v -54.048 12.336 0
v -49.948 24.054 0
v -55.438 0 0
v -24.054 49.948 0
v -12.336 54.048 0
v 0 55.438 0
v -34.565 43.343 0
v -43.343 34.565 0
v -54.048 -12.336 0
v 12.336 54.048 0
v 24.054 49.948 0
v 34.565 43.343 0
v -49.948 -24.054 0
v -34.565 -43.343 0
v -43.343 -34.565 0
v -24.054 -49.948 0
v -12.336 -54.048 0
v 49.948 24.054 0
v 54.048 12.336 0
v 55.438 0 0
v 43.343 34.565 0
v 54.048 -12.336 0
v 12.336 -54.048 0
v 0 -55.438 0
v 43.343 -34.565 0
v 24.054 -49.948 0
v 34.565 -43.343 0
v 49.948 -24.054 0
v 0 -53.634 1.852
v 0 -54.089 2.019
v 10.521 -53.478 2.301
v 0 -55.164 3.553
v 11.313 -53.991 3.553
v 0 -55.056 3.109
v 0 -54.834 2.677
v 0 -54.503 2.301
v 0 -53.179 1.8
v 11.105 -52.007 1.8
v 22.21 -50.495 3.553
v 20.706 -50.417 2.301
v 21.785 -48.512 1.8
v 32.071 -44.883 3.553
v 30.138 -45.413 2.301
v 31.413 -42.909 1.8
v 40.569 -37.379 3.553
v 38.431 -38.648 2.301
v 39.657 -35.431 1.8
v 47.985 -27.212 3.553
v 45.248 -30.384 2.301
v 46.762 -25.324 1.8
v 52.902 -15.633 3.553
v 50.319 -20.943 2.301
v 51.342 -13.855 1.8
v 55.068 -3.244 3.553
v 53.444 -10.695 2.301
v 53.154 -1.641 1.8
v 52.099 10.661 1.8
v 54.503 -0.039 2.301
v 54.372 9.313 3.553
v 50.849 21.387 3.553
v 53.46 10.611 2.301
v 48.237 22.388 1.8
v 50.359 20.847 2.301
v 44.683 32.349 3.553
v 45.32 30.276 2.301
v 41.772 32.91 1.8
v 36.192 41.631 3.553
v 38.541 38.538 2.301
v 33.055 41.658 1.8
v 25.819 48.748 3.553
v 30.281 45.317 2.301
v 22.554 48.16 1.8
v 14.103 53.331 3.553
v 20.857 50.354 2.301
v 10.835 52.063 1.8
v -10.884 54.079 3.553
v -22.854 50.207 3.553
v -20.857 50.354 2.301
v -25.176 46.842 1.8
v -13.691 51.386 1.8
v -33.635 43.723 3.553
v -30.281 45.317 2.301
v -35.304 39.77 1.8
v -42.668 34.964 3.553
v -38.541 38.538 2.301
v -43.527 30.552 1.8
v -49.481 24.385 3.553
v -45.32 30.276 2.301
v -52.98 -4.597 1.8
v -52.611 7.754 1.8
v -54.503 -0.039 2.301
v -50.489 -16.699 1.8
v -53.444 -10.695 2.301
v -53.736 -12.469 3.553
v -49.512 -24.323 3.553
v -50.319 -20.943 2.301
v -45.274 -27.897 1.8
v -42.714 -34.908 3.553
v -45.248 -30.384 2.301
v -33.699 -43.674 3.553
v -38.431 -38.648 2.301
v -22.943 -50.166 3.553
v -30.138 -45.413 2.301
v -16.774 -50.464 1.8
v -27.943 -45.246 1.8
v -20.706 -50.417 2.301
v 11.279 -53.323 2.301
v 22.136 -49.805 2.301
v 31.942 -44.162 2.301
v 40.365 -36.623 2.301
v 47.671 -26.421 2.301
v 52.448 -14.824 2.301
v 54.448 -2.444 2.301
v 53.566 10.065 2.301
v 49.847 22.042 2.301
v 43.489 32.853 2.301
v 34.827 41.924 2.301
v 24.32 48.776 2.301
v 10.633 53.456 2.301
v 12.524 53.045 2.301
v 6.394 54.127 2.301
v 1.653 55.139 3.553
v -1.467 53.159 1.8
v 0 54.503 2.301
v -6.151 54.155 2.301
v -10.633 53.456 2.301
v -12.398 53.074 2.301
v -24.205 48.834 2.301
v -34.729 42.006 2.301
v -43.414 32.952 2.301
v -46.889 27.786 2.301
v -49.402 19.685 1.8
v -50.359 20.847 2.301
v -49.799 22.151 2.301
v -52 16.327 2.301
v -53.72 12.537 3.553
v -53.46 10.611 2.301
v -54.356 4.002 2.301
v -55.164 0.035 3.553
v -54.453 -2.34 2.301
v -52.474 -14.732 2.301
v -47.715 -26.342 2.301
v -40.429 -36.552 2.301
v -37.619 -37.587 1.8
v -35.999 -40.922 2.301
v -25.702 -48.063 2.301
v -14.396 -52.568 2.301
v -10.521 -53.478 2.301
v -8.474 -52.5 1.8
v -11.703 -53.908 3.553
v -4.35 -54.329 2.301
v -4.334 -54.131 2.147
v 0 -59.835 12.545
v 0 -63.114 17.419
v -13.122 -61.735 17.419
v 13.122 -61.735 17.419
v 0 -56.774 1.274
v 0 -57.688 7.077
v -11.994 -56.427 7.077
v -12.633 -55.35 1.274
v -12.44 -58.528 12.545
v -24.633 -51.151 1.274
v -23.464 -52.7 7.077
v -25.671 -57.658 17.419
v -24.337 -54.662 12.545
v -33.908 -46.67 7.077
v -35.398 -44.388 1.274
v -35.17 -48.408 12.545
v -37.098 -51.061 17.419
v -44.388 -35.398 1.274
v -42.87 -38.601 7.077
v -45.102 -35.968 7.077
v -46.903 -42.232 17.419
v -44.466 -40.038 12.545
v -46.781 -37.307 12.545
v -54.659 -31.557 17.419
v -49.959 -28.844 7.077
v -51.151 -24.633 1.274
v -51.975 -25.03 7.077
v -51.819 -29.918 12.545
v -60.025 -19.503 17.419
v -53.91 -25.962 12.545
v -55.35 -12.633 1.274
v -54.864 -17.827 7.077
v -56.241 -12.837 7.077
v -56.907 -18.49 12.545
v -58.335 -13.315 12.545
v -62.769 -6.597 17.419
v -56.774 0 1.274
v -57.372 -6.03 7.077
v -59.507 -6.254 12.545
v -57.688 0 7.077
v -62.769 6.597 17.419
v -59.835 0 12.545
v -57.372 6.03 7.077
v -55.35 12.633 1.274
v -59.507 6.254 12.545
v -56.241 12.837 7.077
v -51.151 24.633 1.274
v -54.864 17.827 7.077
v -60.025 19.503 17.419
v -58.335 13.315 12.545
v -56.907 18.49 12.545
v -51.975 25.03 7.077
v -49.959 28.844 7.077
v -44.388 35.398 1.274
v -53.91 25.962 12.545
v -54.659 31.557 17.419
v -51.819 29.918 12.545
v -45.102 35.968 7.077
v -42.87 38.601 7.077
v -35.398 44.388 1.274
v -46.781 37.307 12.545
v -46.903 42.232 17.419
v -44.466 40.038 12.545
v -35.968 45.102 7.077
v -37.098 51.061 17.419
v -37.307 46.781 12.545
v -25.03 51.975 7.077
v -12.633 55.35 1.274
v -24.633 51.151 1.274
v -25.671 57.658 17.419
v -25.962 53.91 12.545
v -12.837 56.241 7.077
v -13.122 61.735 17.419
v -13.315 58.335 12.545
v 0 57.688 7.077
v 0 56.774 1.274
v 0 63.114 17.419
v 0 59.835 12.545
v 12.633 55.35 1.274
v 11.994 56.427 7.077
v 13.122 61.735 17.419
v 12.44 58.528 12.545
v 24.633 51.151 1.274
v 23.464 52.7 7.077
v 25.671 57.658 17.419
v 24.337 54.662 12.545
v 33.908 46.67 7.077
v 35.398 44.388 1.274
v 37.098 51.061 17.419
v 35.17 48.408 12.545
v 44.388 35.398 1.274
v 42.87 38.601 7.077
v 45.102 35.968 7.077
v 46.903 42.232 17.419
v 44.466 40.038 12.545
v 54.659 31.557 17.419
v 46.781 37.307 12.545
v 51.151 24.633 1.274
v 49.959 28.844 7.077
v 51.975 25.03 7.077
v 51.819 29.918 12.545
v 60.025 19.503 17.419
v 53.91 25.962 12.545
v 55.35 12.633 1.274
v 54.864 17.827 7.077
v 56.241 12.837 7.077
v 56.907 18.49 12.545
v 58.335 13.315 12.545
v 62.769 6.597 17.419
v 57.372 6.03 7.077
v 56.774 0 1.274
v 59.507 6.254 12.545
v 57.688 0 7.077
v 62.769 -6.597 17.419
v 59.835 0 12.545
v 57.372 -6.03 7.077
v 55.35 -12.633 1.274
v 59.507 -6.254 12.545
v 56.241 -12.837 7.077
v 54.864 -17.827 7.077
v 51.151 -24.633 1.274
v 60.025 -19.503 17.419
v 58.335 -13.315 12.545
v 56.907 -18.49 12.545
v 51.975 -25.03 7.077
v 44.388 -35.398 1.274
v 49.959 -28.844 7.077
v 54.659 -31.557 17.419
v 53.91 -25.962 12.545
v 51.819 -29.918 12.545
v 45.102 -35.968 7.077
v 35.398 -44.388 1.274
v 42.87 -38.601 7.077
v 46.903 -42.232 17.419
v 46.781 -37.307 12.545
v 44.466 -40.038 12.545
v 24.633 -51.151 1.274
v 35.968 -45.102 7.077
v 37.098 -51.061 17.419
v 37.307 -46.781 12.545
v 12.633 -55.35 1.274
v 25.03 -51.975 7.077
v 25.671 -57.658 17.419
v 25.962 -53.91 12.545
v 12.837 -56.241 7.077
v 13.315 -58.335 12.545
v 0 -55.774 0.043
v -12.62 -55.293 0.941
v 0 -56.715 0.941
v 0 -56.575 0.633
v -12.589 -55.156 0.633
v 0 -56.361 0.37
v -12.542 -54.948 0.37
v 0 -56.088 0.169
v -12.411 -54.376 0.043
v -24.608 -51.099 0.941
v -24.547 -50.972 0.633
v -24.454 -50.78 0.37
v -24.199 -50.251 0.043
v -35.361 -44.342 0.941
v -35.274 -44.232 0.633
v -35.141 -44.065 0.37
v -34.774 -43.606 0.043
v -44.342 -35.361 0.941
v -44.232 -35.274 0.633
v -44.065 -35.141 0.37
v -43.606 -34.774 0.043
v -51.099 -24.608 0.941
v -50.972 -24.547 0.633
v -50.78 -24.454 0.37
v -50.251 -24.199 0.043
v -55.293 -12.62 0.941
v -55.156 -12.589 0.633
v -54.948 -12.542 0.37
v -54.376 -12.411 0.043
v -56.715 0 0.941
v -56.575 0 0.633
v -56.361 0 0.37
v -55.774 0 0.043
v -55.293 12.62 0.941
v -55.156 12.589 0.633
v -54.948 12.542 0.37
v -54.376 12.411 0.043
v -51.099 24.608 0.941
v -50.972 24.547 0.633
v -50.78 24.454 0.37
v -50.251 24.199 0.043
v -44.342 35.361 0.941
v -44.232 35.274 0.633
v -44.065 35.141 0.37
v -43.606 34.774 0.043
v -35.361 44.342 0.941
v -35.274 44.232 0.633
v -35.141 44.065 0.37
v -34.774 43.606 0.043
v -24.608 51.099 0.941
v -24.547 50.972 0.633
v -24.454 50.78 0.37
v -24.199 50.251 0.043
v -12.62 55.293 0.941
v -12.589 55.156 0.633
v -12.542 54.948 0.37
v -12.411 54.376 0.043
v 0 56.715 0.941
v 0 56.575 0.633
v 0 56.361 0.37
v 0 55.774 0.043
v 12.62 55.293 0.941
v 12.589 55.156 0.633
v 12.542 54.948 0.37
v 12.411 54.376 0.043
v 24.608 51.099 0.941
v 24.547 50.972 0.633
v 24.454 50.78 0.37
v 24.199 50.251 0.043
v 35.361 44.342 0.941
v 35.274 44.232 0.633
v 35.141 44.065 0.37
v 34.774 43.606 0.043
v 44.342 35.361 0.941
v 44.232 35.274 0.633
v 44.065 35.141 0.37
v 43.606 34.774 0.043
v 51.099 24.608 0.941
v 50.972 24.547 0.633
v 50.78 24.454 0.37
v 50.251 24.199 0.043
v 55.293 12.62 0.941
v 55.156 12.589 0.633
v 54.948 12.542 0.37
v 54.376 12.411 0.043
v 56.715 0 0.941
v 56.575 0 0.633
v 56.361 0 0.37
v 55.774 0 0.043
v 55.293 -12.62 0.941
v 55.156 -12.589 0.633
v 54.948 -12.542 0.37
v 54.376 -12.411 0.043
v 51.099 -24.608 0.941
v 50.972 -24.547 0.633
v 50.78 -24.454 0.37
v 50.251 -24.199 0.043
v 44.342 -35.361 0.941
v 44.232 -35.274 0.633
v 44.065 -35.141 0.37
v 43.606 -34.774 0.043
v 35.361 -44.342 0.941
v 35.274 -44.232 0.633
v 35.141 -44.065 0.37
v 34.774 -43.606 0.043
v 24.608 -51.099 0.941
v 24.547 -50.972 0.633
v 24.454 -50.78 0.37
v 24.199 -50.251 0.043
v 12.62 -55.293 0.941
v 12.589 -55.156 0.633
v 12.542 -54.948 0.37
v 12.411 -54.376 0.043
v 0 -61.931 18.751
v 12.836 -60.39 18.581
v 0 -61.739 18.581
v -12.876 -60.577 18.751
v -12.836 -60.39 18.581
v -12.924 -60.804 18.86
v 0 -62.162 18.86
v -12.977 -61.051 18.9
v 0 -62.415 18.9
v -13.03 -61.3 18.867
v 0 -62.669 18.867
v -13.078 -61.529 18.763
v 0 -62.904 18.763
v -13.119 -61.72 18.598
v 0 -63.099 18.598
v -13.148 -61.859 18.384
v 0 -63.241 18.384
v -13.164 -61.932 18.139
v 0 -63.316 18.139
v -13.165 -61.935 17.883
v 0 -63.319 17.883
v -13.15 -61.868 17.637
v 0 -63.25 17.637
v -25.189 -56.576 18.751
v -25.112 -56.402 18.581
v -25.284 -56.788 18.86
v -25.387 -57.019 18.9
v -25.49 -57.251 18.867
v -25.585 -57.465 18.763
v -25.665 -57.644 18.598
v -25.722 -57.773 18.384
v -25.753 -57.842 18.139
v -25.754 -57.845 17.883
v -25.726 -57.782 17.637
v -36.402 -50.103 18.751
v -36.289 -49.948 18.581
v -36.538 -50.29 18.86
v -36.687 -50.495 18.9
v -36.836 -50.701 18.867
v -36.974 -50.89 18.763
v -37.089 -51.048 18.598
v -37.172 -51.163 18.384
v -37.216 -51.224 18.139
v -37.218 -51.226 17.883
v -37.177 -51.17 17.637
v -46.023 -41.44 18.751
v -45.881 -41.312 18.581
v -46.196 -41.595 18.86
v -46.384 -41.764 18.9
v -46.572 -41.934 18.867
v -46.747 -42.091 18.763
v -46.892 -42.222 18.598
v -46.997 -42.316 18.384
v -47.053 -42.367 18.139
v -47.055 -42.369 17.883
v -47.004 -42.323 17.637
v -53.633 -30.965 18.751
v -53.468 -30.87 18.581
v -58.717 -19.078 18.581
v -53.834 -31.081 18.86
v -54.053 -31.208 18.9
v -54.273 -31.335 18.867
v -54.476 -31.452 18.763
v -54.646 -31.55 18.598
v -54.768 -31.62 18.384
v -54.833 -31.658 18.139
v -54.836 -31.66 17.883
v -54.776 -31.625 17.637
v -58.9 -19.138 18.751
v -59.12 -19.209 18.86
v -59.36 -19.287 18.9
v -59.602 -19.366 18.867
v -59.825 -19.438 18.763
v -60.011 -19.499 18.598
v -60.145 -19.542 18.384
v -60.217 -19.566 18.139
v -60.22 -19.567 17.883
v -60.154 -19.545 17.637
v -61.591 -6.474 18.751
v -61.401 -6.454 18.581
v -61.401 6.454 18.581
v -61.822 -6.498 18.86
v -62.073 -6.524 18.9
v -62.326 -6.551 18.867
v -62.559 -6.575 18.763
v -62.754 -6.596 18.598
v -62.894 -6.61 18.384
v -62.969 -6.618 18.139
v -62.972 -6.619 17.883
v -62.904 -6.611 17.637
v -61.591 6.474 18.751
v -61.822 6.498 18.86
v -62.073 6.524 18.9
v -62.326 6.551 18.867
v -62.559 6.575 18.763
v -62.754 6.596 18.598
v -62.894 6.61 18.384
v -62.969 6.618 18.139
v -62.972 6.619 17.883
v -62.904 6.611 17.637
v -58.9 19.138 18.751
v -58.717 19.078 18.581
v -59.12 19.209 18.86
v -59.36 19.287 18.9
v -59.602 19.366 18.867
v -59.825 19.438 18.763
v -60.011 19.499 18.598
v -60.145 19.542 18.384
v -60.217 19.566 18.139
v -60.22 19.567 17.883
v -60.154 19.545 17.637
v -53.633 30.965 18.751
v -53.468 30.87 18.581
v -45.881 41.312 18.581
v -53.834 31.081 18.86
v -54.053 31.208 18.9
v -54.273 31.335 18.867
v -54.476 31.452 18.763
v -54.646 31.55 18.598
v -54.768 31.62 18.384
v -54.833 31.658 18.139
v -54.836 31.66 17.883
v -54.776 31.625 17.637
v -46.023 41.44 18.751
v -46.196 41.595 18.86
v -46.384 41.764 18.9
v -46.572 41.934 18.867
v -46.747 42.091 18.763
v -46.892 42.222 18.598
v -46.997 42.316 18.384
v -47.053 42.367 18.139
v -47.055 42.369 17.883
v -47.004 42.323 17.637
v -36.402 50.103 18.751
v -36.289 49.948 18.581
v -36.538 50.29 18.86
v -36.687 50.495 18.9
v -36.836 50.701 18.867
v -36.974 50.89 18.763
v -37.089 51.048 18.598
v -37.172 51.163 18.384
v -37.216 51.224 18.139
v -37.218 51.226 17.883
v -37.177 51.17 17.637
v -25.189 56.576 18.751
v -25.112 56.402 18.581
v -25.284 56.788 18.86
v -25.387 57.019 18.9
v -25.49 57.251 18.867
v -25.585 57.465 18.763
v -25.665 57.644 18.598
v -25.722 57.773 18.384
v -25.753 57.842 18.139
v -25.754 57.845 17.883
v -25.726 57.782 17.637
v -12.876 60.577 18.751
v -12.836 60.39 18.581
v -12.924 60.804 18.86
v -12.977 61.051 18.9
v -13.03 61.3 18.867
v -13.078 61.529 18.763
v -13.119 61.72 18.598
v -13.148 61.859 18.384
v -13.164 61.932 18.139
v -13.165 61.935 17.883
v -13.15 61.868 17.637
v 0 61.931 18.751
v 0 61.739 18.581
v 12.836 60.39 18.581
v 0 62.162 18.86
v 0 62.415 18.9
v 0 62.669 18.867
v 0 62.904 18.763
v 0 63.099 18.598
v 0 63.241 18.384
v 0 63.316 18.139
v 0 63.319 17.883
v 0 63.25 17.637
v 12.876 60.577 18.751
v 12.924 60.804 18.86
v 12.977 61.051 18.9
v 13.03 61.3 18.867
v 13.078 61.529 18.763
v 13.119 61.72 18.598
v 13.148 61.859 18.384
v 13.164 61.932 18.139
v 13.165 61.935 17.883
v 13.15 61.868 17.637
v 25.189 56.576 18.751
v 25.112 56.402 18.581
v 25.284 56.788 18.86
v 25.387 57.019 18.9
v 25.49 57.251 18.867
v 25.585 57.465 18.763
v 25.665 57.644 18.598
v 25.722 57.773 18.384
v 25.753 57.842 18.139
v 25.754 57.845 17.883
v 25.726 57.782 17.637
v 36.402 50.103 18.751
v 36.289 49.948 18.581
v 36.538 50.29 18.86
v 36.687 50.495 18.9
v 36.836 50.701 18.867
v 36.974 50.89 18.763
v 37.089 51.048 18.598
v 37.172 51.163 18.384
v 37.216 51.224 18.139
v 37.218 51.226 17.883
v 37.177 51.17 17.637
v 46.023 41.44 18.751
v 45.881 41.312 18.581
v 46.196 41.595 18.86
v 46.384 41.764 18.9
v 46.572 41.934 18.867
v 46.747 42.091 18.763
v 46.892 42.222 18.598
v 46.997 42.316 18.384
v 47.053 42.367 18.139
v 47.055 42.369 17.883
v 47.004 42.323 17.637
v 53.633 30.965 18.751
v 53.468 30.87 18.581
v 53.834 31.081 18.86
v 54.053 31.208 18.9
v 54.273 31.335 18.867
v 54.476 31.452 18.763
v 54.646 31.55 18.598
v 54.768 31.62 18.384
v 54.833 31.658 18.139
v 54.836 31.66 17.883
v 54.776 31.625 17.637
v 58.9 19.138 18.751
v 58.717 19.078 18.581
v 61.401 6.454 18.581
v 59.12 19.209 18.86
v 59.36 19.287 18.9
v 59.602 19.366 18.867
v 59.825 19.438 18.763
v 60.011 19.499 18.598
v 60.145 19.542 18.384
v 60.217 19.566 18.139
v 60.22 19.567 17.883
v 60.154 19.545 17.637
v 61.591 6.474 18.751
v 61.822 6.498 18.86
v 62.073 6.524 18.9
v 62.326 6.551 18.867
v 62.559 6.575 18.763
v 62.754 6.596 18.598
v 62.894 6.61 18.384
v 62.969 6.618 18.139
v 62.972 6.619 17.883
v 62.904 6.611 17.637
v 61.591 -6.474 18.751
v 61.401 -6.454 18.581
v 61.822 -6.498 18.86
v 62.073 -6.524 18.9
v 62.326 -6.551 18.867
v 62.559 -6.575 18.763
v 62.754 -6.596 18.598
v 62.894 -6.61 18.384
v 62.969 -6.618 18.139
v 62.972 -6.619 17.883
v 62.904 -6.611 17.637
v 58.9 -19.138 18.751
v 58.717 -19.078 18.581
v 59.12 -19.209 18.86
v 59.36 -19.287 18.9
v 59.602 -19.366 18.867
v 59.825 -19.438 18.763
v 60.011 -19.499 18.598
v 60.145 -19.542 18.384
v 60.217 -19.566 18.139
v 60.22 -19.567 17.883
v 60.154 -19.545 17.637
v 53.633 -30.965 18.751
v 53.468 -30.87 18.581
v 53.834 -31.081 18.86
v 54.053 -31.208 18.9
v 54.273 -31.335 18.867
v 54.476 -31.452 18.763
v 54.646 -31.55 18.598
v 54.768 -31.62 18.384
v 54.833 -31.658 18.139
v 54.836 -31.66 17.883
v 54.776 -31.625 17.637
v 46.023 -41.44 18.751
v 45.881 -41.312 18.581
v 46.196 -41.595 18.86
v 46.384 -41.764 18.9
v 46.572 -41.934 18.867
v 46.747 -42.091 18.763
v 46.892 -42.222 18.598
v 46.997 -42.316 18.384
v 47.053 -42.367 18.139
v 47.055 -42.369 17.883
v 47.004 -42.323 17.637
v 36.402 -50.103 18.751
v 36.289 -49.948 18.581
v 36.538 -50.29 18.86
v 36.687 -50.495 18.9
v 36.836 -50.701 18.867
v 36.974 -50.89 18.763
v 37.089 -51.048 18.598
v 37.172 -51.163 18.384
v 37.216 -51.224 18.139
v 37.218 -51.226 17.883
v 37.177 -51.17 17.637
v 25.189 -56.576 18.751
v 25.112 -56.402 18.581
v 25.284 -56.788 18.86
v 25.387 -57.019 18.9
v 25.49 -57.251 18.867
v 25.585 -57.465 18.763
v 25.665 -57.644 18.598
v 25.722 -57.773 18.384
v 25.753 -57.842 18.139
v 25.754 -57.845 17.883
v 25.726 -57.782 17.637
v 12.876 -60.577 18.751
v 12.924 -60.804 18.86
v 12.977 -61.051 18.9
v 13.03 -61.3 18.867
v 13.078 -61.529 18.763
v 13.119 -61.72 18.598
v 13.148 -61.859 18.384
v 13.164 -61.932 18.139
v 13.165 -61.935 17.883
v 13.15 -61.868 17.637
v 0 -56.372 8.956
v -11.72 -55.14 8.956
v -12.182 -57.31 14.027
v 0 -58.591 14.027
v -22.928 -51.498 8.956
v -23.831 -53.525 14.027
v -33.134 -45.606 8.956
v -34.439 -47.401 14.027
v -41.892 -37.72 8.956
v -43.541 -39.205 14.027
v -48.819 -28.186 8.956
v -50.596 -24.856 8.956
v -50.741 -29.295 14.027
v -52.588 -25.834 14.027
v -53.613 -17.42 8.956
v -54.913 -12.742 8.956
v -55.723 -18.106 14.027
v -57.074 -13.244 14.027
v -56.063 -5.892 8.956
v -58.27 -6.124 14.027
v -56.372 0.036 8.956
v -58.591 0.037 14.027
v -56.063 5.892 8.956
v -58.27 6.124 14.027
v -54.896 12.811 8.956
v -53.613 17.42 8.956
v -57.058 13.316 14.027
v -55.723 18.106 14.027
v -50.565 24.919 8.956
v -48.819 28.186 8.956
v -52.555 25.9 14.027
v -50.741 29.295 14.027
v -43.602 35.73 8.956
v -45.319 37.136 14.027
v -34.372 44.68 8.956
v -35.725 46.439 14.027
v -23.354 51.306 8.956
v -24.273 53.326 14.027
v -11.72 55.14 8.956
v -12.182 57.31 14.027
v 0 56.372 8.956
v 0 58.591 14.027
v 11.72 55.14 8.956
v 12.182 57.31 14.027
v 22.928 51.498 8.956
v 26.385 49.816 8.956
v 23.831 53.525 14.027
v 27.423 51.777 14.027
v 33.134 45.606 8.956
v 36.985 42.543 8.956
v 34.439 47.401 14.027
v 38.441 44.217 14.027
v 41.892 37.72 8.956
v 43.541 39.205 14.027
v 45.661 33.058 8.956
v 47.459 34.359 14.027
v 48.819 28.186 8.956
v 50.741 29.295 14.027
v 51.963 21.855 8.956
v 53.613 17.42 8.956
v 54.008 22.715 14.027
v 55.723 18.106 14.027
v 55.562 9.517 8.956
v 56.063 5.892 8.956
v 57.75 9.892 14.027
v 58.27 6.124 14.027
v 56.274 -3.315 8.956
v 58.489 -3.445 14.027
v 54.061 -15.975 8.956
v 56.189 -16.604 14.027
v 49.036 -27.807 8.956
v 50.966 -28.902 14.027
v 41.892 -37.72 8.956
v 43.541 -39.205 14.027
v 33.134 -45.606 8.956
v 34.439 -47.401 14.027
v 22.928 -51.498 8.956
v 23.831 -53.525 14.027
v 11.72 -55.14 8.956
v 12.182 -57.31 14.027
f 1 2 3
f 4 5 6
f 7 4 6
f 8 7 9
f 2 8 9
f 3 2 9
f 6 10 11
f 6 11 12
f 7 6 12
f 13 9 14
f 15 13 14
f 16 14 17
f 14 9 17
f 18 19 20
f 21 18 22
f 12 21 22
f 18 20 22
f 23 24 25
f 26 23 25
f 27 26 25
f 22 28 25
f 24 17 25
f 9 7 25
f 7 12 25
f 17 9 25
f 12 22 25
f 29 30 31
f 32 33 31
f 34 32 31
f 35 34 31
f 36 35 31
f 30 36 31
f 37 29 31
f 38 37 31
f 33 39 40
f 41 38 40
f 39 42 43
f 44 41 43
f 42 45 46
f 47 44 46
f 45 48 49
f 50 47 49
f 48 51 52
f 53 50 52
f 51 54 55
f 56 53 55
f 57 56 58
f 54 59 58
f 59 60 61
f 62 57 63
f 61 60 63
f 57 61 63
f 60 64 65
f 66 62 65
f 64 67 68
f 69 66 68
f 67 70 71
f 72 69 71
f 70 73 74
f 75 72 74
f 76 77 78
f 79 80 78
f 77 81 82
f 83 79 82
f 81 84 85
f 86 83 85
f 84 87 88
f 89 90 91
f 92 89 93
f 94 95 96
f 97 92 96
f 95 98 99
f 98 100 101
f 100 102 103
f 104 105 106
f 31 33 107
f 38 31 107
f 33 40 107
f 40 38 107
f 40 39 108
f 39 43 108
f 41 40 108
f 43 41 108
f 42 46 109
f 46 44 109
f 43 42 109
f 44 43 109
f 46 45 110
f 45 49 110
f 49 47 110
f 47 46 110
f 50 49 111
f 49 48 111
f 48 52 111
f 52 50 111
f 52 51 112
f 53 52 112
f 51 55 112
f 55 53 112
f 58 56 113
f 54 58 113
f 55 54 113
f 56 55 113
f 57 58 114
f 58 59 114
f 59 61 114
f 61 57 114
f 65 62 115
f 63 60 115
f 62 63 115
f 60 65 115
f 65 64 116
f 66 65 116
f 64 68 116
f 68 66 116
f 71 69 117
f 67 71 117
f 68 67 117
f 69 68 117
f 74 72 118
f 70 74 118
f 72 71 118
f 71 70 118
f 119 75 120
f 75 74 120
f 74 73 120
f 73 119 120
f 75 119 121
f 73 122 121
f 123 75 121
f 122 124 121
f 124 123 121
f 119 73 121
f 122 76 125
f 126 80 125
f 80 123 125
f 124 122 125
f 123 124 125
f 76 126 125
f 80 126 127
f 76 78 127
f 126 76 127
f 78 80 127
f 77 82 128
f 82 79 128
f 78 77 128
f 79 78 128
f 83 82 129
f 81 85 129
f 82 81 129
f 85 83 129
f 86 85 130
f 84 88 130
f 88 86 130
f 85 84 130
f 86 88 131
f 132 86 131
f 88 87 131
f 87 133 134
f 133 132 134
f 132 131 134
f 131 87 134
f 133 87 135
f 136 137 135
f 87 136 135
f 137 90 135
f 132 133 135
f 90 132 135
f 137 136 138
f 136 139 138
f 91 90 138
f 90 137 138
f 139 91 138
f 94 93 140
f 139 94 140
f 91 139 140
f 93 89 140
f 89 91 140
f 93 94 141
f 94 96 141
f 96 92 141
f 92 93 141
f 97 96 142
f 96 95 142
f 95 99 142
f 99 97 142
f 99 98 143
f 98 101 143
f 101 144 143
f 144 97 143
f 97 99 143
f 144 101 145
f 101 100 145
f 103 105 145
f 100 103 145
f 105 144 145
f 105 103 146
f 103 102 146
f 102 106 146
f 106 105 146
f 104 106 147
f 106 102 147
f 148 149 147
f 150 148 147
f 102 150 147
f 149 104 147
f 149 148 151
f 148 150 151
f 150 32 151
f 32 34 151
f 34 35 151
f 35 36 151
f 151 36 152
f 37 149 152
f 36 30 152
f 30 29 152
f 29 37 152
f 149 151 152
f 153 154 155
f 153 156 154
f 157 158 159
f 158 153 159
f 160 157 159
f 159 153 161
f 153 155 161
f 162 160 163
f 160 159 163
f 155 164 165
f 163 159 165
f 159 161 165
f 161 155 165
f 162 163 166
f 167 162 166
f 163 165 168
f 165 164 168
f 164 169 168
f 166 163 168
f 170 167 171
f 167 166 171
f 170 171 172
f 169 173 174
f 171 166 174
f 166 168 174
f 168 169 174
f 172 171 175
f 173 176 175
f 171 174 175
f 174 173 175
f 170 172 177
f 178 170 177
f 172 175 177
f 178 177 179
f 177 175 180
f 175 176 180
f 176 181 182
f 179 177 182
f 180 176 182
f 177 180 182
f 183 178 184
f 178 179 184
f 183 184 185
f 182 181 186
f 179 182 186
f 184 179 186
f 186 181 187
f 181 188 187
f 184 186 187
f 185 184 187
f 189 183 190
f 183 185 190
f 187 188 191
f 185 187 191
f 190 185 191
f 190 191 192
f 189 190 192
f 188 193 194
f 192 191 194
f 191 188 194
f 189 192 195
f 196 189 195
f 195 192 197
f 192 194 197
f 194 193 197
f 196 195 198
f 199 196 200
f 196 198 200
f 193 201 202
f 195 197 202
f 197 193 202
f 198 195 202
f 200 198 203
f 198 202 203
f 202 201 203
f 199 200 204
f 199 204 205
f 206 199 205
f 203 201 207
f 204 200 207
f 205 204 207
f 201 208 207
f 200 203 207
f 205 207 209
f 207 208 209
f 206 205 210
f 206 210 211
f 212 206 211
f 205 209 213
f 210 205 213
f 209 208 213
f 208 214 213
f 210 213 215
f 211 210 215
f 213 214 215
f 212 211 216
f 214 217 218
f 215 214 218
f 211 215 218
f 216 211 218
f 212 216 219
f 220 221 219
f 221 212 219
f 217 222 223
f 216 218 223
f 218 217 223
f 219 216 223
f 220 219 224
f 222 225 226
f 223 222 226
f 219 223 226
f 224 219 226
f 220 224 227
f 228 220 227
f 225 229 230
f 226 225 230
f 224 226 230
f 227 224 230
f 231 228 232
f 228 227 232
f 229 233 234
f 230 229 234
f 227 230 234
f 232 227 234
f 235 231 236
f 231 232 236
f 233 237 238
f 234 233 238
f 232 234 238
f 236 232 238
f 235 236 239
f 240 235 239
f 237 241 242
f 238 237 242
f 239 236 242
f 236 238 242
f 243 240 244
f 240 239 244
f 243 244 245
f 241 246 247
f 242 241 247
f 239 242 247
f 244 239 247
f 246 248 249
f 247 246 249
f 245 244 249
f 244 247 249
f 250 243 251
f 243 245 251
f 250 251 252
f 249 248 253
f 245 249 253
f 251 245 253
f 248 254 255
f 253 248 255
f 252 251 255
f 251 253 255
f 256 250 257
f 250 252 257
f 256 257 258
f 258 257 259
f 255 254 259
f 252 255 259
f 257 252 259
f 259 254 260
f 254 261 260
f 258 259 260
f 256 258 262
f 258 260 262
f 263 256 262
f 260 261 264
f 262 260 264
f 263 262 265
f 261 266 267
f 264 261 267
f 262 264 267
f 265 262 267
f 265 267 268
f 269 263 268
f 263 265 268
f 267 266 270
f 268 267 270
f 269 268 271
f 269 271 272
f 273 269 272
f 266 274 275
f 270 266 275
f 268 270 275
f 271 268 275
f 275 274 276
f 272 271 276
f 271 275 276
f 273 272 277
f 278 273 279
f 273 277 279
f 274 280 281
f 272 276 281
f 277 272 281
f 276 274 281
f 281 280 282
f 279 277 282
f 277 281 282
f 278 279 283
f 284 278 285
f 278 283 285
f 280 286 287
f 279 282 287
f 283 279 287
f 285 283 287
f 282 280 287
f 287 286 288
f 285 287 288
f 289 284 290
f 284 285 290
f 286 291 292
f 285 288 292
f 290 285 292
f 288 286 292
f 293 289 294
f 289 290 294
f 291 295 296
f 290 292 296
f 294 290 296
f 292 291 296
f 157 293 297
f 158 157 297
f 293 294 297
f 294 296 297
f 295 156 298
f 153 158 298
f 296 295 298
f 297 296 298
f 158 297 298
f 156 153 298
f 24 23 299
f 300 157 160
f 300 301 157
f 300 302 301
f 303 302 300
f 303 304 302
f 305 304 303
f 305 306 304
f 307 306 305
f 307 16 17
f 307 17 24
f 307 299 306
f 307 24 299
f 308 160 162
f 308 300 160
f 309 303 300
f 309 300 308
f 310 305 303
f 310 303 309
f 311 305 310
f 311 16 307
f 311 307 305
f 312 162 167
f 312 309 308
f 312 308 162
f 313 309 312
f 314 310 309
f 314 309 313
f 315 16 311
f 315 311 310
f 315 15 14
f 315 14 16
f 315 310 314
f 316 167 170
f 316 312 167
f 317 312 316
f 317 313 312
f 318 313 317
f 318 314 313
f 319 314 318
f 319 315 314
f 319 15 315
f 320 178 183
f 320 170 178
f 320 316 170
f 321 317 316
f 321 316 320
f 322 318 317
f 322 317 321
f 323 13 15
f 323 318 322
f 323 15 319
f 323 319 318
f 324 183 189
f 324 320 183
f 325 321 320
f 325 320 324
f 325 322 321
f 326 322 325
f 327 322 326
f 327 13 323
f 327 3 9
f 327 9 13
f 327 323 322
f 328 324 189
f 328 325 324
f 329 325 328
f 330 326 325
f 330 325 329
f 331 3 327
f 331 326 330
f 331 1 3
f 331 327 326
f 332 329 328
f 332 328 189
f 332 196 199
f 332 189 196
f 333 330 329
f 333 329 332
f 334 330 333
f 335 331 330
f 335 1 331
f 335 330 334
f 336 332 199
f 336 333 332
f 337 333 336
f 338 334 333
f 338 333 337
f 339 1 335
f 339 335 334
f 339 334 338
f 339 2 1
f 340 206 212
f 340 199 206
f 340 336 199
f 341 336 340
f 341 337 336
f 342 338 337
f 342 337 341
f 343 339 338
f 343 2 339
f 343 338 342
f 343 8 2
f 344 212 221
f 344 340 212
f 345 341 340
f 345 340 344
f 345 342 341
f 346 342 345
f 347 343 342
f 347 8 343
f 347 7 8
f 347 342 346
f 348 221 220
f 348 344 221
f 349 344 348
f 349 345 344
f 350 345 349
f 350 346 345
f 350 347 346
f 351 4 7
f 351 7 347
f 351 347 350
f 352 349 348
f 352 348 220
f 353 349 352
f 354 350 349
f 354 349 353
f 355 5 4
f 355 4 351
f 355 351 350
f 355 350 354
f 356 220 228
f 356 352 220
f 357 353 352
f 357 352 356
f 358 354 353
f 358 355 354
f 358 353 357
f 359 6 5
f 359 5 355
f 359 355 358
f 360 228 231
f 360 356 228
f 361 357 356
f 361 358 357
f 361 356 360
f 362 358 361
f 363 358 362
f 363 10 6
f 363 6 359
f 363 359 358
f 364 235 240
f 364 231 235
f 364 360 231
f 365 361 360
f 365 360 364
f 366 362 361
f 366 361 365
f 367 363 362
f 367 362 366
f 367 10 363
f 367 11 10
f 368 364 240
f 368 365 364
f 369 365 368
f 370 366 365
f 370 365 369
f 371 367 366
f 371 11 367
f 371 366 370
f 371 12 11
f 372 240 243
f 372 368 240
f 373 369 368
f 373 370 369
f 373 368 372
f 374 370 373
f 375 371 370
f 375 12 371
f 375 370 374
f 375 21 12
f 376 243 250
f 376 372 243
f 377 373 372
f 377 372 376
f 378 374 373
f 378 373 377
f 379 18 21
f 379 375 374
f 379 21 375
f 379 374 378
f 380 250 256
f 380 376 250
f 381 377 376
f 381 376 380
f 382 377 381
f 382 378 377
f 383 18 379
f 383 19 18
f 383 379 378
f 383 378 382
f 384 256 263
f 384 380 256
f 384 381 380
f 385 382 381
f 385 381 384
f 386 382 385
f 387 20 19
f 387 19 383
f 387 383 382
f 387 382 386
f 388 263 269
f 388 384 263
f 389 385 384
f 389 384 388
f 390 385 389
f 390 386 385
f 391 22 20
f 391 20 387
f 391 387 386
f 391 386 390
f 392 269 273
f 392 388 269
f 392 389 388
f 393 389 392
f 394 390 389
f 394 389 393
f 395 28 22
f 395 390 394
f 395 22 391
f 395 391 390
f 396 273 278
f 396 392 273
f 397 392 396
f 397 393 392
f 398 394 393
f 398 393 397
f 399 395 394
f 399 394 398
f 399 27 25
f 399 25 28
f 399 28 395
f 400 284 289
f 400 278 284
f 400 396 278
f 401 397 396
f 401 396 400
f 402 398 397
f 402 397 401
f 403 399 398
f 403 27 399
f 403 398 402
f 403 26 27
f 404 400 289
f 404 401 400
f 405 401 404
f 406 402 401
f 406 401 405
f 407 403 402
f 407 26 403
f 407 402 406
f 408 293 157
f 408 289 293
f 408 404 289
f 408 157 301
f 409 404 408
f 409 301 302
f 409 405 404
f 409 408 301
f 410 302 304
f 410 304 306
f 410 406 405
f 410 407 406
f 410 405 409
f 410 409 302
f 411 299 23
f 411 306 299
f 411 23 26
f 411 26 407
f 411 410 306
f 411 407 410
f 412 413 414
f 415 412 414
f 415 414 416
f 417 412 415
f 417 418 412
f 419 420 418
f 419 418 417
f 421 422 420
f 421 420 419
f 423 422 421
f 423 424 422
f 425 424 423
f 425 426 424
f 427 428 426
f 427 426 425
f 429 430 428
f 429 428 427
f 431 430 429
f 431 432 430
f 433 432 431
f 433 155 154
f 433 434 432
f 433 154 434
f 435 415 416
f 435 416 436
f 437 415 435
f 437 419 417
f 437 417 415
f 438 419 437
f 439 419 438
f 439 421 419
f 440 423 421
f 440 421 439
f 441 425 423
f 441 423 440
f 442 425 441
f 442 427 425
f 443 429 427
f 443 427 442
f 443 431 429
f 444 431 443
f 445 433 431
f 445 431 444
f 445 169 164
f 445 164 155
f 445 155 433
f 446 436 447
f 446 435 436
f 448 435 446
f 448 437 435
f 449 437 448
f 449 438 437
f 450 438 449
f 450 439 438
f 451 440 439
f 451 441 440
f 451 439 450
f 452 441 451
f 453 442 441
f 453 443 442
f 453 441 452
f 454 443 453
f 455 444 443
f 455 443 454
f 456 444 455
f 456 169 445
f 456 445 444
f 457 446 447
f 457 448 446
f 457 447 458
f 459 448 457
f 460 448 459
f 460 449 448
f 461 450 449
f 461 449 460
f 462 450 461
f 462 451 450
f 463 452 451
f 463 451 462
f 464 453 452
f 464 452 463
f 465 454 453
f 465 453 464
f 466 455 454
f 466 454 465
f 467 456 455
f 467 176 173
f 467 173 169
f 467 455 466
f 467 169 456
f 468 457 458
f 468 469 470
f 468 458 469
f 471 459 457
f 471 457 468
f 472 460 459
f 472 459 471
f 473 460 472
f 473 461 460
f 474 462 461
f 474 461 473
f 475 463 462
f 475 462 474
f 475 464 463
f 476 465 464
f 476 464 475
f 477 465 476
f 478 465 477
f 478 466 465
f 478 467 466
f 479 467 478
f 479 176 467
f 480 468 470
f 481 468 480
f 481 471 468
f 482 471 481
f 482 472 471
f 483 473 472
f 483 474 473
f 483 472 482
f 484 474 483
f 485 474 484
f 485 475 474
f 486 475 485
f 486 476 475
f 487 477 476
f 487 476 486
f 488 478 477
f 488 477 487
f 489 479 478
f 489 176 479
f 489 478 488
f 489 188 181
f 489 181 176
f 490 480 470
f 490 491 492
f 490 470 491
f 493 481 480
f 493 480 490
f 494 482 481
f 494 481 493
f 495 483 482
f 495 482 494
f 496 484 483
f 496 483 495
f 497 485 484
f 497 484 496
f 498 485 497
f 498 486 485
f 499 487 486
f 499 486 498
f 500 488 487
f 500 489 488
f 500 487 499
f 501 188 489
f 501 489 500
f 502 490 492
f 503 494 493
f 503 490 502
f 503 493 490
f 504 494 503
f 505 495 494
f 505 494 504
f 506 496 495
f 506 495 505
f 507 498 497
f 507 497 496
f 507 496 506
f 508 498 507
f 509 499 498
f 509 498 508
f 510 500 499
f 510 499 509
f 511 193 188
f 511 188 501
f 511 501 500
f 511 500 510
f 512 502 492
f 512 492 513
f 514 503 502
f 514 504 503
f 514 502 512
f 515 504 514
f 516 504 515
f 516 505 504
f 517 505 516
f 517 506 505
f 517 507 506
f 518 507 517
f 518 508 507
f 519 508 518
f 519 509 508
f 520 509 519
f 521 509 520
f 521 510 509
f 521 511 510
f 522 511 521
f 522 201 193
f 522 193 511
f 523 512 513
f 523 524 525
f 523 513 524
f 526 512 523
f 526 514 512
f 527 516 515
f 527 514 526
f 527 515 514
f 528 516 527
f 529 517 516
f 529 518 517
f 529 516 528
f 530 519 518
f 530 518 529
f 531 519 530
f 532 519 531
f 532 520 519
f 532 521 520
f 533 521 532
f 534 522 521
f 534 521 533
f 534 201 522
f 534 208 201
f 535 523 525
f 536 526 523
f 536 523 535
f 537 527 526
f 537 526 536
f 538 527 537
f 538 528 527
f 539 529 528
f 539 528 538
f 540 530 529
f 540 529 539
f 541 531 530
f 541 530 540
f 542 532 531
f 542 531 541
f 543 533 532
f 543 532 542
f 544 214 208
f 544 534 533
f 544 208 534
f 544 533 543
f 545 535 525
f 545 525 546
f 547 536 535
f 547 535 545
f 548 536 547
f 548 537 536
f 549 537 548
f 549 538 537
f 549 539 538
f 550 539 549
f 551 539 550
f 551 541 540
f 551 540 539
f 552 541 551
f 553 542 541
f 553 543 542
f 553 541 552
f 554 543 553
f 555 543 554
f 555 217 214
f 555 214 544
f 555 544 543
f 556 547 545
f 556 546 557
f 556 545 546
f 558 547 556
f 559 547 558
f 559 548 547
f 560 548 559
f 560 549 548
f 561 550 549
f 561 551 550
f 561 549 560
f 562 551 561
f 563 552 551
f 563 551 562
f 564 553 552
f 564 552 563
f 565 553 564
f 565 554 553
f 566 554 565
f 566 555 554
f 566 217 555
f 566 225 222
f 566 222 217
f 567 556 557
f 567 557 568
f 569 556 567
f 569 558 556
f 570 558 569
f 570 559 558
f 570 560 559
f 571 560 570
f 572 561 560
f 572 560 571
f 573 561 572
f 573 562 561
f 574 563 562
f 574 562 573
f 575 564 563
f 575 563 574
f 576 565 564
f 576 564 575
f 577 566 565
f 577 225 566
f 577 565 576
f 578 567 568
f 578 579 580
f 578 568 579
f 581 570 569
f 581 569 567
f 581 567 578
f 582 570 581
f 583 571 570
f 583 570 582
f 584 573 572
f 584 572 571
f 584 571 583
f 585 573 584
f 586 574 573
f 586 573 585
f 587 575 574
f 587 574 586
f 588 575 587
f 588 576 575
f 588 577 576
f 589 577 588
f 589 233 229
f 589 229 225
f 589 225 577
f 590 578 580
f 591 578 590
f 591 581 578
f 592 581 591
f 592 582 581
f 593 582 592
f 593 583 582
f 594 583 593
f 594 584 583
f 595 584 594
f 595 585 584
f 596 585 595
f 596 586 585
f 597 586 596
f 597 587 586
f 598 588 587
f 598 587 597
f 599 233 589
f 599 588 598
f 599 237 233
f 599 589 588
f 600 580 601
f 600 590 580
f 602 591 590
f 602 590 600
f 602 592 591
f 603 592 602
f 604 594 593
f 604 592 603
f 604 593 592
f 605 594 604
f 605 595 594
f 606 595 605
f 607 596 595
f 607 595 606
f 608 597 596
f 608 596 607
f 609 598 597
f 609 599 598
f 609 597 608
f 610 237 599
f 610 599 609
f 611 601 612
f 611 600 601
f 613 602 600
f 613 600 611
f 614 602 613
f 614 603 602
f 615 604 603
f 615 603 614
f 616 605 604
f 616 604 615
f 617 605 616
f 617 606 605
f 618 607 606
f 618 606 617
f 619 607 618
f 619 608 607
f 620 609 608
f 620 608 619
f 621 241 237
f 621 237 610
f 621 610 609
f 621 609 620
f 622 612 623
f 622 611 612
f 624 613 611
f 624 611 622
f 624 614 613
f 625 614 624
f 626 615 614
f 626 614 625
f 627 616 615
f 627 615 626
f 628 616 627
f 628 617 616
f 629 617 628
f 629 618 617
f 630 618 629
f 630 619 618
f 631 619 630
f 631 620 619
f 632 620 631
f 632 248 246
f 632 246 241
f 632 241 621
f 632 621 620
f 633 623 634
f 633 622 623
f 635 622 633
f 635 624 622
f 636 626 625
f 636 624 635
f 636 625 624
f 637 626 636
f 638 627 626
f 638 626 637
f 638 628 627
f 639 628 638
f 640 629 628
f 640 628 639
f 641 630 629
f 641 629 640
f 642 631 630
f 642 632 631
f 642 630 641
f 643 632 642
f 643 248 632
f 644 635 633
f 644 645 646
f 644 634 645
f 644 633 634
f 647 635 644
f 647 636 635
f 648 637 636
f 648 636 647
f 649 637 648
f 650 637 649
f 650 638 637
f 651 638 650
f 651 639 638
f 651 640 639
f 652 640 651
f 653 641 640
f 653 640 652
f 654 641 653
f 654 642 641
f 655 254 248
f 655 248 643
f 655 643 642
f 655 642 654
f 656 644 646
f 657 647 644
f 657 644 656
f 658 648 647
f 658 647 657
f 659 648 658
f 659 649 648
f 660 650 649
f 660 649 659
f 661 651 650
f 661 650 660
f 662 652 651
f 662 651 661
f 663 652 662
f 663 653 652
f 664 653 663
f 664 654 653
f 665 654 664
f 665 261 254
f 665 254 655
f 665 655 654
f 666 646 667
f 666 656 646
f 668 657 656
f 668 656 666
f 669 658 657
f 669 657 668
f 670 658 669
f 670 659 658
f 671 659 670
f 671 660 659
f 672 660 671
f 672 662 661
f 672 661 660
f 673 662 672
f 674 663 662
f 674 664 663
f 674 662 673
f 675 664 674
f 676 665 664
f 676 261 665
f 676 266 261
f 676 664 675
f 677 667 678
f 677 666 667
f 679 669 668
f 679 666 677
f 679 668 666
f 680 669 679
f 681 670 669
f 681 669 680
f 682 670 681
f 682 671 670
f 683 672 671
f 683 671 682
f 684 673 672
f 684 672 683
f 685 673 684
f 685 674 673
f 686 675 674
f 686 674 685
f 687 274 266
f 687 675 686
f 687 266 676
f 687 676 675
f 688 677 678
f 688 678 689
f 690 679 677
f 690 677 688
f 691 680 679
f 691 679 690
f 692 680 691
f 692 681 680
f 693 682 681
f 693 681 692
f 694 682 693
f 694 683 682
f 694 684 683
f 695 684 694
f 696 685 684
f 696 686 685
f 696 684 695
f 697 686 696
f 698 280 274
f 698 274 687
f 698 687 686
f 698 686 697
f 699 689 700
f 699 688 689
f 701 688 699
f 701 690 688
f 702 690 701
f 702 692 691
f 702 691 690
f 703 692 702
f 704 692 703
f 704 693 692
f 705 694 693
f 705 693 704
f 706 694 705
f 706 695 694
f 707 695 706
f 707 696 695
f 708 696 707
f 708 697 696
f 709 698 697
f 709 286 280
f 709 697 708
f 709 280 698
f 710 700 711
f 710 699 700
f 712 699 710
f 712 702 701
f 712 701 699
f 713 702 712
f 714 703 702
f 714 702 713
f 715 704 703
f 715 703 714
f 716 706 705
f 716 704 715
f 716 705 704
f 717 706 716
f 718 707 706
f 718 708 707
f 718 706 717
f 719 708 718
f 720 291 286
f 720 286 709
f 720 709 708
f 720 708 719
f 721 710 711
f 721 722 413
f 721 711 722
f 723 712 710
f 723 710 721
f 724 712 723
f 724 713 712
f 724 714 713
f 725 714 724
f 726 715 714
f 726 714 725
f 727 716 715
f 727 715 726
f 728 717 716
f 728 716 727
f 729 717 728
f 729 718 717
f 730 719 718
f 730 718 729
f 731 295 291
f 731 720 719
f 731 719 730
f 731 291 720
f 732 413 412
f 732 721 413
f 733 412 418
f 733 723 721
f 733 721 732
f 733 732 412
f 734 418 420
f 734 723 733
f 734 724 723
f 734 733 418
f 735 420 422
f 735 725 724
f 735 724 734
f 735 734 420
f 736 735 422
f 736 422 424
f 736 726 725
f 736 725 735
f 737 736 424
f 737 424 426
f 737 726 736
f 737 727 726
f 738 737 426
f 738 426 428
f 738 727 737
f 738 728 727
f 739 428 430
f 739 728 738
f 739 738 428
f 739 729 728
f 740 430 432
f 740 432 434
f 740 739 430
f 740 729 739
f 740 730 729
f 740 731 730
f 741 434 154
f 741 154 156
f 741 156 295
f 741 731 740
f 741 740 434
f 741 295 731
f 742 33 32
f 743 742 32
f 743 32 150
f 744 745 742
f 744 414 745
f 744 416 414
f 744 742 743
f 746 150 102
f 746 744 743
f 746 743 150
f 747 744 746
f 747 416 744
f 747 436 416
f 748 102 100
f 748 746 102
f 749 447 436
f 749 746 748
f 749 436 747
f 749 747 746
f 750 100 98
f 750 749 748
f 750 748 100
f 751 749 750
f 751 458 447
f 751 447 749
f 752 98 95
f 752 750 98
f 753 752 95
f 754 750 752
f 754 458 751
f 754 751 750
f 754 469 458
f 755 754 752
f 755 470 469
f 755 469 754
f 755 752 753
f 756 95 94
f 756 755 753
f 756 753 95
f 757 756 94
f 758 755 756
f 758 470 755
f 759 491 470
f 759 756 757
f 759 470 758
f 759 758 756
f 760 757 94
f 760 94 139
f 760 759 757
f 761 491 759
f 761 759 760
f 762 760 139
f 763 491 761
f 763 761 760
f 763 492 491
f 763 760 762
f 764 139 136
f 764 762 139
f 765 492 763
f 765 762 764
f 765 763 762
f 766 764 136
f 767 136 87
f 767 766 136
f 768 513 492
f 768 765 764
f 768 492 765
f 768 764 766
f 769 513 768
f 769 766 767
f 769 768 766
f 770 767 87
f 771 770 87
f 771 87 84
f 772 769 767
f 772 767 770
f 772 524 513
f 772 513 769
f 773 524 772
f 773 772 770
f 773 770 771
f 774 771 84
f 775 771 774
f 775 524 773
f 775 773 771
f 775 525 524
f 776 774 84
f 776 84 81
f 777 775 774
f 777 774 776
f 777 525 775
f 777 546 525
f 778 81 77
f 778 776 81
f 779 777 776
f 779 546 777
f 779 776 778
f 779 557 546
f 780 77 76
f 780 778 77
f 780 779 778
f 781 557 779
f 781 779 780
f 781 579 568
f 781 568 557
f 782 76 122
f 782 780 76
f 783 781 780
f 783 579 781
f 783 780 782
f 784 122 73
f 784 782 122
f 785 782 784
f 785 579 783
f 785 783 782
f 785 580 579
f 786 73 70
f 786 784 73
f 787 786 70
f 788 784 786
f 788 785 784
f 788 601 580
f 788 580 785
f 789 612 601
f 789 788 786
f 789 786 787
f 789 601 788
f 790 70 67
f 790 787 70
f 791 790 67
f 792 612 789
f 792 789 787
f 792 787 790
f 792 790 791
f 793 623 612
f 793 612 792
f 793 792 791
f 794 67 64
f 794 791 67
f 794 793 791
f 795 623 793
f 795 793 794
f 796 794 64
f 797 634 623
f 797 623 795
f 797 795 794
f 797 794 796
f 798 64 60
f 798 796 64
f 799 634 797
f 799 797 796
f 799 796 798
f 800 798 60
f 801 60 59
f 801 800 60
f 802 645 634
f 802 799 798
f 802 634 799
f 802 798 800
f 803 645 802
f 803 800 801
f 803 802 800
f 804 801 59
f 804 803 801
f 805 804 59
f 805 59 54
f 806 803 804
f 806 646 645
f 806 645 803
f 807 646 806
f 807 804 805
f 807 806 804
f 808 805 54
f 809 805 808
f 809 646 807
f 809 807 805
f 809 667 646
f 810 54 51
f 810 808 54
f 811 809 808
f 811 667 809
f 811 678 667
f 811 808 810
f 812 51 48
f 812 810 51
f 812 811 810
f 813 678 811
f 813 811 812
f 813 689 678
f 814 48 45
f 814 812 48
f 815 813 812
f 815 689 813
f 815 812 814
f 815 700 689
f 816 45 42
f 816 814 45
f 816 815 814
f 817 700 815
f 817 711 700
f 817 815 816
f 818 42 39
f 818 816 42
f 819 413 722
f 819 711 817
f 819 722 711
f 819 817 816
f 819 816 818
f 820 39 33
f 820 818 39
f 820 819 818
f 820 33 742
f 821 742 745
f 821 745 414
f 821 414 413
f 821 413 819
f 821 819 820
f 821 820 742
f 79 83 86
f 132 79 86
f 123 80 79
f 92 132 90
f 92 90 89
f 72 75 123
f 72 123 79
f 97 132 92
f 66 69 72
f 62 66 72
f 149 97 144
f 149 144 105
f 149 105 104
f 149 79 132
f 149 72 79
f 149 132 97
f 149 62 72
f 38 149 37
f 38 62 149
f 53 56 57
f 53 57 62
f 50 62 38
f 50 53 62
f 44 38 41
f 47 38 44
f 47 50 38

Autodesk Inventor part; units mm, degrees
ref_plane "YZ Plane" through (0, 0, 0) normal (1, 0, 0) x (0, 1, 0)
ref_plane "XZ Plane" through (0, 0, 0) normal (0, 1, 0) x (-1, 0, 0)
ref_plane "XY Plane" through (0, 0, 0) normal (0, 0, 1) x (1, 0, 0)
sketch "Sketch1" plane through (0, 0, 0) normal (1, 0, 0) x (0, 1, 0)
  line L0 (-100.4924, 0) -> (16.7487, 0) projected
  line L1 (0, -4.1746) -> (0, 23.1754) projected
  arc A0 (-56.7738, 1.2743) -> (-63.1144, 17.4194) centre (-83.7437, 0) ccw
  arc A1 (-61.7392, 18.5806) -> (-63.1144, 17.4194) centre (-62.4268, 18) ccw
  arc A2 (-55, 1.8) -> (-61.7392, 18.5806) centre (-83.7437, 0) ccw
  line L2 (-55.4379, 0) -> (0, 0)
  line L3 (-55, 1.8) -> (0, 1.8)
  arc A3 (-56.7738, 1.2743) -> (-55.4379, 0) centre (-55.4379, 1.3374) ccw
  dimension "d0" = 0.9
  dimension "d1" = 55
  dimension "d2" = 1.8
  dimension "d3" = 18
  dimension "d6" = 27
revolve "Revolution1" add sketch "Sketch1" angle 360 about axis through (0, 0, -10) along (0, 0, 1)
fillet "Fillet1" radius 2 1 edges at (0, 55, 1.8)
properties part number "plato1"
